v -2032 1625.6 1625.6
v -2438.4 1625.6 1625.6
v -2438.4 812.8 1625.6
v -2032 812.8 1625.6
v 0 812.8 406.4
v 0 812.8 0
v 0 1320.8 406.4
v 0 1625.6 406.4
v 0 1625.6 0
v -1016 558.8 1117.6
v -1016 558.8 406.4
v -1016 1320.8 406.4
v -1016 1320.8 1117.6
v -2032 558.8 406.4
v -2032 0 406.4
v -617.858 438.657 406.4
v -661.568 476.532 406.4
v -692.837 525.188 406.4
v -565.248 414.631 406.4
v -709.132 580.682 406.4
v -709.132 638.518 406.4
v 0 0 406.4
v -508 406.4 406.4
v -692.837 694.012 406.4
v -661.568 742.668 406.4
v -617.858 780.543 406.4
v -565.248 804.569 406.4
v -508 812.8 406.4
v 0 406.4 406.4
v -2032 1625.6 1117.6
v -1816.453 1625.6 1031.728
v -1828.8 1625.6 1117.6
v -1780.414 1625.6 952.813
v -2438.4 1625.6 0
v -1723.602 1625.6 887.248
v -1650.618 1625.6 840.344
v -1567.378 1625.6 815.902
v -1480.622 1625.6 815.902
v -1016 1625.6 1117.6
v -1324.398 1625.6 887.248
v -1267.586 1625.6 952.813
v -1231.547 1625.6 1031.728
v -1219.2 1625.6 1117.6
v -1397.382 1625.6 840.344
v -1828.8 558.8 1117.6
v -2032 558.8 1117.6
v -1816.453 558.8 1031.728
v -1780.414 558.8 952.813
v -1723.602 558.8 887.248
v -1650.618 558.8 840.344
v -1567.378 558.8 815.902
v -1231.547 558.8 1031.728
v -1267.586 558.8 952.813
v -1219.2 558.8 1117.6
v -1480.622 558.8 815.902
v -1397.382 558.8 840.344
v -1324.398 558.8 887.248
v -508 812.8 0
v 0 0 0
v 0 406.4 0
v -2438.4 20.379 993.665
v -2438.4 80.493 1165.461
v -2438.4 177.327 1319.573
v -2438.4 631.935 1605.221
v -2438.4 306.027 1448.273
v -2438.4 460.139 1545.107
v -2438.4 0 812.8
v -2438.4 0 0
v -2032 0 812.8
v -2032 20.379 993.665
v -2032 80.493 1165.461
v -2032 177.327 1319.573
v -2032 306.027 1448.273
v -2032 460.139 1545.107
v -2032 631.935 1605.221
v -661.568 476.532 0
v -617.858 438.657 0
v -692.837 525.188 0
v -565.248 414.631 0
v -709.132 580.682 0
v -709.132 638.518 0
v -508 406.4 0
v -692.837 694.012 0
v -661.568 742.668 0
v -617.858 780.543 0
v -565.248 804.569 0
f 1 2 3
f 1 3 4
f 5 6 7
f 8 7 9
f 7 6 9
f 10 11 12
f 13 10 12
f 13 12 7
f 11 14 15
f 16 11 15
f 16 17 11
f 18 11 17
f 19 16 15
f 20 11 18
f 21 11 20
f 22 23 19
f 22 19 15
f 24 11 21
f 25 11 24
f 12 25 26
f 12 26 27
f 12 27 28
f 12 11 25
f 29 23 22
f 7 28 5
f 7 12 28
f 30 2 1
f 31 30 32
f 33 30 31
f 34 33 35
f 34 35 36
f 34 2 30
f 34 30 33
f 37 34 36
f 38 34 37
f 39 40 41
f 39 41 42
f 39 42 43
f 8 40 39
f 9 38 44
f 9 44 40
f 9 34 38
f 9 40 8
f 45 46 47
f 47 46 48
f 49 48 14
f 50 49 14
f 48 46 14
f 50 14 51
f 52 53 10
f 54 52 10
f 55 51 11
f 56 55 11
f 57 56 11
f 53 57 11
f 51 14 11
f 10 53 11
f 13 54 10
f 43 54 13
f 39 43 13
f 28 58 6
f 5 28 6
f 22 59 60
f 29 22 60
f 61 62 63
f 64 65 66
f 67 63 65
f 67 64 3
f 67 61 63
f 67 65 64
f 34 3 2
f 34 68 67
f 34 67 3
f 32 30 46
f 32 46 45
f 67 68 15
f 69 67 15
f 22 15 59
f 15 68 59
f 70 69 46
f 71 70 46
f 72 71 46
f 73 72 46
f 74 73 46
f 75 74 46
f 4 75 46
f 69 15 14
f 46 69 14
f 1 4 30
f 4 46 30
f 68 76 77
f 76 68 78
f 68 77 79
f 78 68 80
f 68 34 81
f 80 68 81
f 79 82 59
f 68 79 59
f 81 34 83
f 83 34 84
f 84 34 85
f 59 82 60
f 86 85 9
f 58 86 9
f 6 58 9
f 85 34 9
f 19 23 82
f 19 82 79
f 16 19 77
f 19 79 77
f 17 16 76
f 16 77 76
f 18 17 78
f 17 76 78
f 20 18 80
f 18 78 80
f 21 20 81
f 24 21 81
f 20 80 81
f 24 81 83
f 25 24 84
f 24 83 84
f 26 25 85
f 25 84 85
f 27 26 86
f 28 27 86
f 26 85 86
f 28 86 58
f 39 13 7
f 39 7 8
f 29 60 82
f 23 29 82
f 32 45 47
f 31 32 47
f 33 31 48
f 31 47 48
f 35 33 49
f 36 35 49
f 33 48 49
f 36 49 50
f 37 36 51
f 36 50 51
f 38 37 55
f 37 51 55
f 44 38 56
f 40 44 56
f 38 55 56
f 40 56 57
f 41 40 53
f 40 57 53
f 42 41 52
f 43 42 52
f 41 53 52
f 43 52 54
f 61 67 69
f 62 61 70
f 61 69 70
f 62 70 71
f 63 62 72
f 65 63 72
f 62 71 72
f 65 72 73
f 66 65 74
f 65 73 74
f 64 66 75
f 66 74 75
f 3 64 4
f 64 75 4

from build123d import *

# Parameters (mm, degrees)
F1_DEPTH  = 406.4
F2_W      = 406.4
F2_H      = 1625.6
F3_DEPTH  = 1219.2
F4_R      = 812.8
F5_W      = 1016
F5_H      = 1066.8
F6_DEPTH  = 711.2
F8_DEPTH  = 1066.8
F9_W      = 1016
F9_H      = 304.8
F10_DEPTH = 711.2
F11_SIZE2 = 1016
F11_SIZE  = 711.2


with BuildPart() as f1:
    # F0 (on Top) → F1 (new body)
    with BuildSketch(Plane.XY):
        with BuildLine():
            Line((-2438.4, 0), (0, 0))
            Line((0, 0), (0, 406.4))
            Line((0, 406.4), (-508, 406.4))
            ThreePointArc((-508, 406.4), (-711.2, 609.6), (-508, 812.8))
            Line((-508, 812.8), (0, 812.8))
            Line((0, 812.8), (0, 1320.8))
            Line((0, 1320.8), (0, 1625.6))
            Line((0, 1625.6), (-863.6, 1625.6))
            Line((-863.6, 1625.6), (-2438.4, 1625.6))
            Line((-2438.4, 1625.6), (-2438.4, 0))
        make_face()
    extrude(amount=F1_DEPTH)

    # F2 (on face) → F3 (join)
    with BuildSketch(Plane.XY.offset(406.4)):
        with Locations((-2235.2, 812.8)):
            Rectangle(F2_W, F2_H)
    extrude(amount=F3_DEPTH)

    # F4
    f4_edges = [f1.edges().sort_by_distance(p)[0] for p in [
        (-2235.2, 0, 1625.6),
    ]]
    fillet(f4_edges, radius=F4_R)

    # F5 (on face) → F6 (join)
    with BuildSketch(Plane.XY.offset(406.4)):
        with Locations((-1524, 1092.2)):
            Rectangle(F5_W, F5_H)
    extrude(amount=F6_DEPTH)

    # F7 (on face) → F8 (cut)
    with BuildSketch(Plane.XZ.offset(-558.8)):
        with BuildLine():
            Line((-1524, 1117.6), (-1219.2, 1117.6))
            ThreePointArc((-1219.2, 1117.6), (-1524, 1422.4), (-1828.8, 1117.6))
            Line((-1828.8, 1117.6), (-1524, 1117.6))
        make_face()
        with BuildLine():
            ThreePointArc((-1828.8, 1117.6), (-1524, 812.8), (-1219.2, 1117.6))
            Line((-1219.2, 1117.6), (-1524, 1117.6))
            Line((-1524, 1117.6), (-1828.8, 1117.6))
        make_face()
    extrude(amount=-F8_DEPTH, mode=Mode.SUBTRACT)

    # F9 (on face) → F10 (join)
    with BuildSketch(Plane.XY.offset(406.4)):
        with Locations((-508, 1473.2)):
            Rectangle(F9_W, F9_H)
    extrude(amount=F10_DEPTH)

    # F11
    f11_edges = [f1.edges().sort_by_distance(p)[0] for p in [
        (0, 1473.2, 1117.6),
    ]]
    f11_side = f1.faces().sort_by_distance((0, 826.619094, 203.2))[0]
    chamfer(f11_edges, length=F11_SIZE, length2=F11_SIZE2, reference=f11_side)


solid = f1.part
